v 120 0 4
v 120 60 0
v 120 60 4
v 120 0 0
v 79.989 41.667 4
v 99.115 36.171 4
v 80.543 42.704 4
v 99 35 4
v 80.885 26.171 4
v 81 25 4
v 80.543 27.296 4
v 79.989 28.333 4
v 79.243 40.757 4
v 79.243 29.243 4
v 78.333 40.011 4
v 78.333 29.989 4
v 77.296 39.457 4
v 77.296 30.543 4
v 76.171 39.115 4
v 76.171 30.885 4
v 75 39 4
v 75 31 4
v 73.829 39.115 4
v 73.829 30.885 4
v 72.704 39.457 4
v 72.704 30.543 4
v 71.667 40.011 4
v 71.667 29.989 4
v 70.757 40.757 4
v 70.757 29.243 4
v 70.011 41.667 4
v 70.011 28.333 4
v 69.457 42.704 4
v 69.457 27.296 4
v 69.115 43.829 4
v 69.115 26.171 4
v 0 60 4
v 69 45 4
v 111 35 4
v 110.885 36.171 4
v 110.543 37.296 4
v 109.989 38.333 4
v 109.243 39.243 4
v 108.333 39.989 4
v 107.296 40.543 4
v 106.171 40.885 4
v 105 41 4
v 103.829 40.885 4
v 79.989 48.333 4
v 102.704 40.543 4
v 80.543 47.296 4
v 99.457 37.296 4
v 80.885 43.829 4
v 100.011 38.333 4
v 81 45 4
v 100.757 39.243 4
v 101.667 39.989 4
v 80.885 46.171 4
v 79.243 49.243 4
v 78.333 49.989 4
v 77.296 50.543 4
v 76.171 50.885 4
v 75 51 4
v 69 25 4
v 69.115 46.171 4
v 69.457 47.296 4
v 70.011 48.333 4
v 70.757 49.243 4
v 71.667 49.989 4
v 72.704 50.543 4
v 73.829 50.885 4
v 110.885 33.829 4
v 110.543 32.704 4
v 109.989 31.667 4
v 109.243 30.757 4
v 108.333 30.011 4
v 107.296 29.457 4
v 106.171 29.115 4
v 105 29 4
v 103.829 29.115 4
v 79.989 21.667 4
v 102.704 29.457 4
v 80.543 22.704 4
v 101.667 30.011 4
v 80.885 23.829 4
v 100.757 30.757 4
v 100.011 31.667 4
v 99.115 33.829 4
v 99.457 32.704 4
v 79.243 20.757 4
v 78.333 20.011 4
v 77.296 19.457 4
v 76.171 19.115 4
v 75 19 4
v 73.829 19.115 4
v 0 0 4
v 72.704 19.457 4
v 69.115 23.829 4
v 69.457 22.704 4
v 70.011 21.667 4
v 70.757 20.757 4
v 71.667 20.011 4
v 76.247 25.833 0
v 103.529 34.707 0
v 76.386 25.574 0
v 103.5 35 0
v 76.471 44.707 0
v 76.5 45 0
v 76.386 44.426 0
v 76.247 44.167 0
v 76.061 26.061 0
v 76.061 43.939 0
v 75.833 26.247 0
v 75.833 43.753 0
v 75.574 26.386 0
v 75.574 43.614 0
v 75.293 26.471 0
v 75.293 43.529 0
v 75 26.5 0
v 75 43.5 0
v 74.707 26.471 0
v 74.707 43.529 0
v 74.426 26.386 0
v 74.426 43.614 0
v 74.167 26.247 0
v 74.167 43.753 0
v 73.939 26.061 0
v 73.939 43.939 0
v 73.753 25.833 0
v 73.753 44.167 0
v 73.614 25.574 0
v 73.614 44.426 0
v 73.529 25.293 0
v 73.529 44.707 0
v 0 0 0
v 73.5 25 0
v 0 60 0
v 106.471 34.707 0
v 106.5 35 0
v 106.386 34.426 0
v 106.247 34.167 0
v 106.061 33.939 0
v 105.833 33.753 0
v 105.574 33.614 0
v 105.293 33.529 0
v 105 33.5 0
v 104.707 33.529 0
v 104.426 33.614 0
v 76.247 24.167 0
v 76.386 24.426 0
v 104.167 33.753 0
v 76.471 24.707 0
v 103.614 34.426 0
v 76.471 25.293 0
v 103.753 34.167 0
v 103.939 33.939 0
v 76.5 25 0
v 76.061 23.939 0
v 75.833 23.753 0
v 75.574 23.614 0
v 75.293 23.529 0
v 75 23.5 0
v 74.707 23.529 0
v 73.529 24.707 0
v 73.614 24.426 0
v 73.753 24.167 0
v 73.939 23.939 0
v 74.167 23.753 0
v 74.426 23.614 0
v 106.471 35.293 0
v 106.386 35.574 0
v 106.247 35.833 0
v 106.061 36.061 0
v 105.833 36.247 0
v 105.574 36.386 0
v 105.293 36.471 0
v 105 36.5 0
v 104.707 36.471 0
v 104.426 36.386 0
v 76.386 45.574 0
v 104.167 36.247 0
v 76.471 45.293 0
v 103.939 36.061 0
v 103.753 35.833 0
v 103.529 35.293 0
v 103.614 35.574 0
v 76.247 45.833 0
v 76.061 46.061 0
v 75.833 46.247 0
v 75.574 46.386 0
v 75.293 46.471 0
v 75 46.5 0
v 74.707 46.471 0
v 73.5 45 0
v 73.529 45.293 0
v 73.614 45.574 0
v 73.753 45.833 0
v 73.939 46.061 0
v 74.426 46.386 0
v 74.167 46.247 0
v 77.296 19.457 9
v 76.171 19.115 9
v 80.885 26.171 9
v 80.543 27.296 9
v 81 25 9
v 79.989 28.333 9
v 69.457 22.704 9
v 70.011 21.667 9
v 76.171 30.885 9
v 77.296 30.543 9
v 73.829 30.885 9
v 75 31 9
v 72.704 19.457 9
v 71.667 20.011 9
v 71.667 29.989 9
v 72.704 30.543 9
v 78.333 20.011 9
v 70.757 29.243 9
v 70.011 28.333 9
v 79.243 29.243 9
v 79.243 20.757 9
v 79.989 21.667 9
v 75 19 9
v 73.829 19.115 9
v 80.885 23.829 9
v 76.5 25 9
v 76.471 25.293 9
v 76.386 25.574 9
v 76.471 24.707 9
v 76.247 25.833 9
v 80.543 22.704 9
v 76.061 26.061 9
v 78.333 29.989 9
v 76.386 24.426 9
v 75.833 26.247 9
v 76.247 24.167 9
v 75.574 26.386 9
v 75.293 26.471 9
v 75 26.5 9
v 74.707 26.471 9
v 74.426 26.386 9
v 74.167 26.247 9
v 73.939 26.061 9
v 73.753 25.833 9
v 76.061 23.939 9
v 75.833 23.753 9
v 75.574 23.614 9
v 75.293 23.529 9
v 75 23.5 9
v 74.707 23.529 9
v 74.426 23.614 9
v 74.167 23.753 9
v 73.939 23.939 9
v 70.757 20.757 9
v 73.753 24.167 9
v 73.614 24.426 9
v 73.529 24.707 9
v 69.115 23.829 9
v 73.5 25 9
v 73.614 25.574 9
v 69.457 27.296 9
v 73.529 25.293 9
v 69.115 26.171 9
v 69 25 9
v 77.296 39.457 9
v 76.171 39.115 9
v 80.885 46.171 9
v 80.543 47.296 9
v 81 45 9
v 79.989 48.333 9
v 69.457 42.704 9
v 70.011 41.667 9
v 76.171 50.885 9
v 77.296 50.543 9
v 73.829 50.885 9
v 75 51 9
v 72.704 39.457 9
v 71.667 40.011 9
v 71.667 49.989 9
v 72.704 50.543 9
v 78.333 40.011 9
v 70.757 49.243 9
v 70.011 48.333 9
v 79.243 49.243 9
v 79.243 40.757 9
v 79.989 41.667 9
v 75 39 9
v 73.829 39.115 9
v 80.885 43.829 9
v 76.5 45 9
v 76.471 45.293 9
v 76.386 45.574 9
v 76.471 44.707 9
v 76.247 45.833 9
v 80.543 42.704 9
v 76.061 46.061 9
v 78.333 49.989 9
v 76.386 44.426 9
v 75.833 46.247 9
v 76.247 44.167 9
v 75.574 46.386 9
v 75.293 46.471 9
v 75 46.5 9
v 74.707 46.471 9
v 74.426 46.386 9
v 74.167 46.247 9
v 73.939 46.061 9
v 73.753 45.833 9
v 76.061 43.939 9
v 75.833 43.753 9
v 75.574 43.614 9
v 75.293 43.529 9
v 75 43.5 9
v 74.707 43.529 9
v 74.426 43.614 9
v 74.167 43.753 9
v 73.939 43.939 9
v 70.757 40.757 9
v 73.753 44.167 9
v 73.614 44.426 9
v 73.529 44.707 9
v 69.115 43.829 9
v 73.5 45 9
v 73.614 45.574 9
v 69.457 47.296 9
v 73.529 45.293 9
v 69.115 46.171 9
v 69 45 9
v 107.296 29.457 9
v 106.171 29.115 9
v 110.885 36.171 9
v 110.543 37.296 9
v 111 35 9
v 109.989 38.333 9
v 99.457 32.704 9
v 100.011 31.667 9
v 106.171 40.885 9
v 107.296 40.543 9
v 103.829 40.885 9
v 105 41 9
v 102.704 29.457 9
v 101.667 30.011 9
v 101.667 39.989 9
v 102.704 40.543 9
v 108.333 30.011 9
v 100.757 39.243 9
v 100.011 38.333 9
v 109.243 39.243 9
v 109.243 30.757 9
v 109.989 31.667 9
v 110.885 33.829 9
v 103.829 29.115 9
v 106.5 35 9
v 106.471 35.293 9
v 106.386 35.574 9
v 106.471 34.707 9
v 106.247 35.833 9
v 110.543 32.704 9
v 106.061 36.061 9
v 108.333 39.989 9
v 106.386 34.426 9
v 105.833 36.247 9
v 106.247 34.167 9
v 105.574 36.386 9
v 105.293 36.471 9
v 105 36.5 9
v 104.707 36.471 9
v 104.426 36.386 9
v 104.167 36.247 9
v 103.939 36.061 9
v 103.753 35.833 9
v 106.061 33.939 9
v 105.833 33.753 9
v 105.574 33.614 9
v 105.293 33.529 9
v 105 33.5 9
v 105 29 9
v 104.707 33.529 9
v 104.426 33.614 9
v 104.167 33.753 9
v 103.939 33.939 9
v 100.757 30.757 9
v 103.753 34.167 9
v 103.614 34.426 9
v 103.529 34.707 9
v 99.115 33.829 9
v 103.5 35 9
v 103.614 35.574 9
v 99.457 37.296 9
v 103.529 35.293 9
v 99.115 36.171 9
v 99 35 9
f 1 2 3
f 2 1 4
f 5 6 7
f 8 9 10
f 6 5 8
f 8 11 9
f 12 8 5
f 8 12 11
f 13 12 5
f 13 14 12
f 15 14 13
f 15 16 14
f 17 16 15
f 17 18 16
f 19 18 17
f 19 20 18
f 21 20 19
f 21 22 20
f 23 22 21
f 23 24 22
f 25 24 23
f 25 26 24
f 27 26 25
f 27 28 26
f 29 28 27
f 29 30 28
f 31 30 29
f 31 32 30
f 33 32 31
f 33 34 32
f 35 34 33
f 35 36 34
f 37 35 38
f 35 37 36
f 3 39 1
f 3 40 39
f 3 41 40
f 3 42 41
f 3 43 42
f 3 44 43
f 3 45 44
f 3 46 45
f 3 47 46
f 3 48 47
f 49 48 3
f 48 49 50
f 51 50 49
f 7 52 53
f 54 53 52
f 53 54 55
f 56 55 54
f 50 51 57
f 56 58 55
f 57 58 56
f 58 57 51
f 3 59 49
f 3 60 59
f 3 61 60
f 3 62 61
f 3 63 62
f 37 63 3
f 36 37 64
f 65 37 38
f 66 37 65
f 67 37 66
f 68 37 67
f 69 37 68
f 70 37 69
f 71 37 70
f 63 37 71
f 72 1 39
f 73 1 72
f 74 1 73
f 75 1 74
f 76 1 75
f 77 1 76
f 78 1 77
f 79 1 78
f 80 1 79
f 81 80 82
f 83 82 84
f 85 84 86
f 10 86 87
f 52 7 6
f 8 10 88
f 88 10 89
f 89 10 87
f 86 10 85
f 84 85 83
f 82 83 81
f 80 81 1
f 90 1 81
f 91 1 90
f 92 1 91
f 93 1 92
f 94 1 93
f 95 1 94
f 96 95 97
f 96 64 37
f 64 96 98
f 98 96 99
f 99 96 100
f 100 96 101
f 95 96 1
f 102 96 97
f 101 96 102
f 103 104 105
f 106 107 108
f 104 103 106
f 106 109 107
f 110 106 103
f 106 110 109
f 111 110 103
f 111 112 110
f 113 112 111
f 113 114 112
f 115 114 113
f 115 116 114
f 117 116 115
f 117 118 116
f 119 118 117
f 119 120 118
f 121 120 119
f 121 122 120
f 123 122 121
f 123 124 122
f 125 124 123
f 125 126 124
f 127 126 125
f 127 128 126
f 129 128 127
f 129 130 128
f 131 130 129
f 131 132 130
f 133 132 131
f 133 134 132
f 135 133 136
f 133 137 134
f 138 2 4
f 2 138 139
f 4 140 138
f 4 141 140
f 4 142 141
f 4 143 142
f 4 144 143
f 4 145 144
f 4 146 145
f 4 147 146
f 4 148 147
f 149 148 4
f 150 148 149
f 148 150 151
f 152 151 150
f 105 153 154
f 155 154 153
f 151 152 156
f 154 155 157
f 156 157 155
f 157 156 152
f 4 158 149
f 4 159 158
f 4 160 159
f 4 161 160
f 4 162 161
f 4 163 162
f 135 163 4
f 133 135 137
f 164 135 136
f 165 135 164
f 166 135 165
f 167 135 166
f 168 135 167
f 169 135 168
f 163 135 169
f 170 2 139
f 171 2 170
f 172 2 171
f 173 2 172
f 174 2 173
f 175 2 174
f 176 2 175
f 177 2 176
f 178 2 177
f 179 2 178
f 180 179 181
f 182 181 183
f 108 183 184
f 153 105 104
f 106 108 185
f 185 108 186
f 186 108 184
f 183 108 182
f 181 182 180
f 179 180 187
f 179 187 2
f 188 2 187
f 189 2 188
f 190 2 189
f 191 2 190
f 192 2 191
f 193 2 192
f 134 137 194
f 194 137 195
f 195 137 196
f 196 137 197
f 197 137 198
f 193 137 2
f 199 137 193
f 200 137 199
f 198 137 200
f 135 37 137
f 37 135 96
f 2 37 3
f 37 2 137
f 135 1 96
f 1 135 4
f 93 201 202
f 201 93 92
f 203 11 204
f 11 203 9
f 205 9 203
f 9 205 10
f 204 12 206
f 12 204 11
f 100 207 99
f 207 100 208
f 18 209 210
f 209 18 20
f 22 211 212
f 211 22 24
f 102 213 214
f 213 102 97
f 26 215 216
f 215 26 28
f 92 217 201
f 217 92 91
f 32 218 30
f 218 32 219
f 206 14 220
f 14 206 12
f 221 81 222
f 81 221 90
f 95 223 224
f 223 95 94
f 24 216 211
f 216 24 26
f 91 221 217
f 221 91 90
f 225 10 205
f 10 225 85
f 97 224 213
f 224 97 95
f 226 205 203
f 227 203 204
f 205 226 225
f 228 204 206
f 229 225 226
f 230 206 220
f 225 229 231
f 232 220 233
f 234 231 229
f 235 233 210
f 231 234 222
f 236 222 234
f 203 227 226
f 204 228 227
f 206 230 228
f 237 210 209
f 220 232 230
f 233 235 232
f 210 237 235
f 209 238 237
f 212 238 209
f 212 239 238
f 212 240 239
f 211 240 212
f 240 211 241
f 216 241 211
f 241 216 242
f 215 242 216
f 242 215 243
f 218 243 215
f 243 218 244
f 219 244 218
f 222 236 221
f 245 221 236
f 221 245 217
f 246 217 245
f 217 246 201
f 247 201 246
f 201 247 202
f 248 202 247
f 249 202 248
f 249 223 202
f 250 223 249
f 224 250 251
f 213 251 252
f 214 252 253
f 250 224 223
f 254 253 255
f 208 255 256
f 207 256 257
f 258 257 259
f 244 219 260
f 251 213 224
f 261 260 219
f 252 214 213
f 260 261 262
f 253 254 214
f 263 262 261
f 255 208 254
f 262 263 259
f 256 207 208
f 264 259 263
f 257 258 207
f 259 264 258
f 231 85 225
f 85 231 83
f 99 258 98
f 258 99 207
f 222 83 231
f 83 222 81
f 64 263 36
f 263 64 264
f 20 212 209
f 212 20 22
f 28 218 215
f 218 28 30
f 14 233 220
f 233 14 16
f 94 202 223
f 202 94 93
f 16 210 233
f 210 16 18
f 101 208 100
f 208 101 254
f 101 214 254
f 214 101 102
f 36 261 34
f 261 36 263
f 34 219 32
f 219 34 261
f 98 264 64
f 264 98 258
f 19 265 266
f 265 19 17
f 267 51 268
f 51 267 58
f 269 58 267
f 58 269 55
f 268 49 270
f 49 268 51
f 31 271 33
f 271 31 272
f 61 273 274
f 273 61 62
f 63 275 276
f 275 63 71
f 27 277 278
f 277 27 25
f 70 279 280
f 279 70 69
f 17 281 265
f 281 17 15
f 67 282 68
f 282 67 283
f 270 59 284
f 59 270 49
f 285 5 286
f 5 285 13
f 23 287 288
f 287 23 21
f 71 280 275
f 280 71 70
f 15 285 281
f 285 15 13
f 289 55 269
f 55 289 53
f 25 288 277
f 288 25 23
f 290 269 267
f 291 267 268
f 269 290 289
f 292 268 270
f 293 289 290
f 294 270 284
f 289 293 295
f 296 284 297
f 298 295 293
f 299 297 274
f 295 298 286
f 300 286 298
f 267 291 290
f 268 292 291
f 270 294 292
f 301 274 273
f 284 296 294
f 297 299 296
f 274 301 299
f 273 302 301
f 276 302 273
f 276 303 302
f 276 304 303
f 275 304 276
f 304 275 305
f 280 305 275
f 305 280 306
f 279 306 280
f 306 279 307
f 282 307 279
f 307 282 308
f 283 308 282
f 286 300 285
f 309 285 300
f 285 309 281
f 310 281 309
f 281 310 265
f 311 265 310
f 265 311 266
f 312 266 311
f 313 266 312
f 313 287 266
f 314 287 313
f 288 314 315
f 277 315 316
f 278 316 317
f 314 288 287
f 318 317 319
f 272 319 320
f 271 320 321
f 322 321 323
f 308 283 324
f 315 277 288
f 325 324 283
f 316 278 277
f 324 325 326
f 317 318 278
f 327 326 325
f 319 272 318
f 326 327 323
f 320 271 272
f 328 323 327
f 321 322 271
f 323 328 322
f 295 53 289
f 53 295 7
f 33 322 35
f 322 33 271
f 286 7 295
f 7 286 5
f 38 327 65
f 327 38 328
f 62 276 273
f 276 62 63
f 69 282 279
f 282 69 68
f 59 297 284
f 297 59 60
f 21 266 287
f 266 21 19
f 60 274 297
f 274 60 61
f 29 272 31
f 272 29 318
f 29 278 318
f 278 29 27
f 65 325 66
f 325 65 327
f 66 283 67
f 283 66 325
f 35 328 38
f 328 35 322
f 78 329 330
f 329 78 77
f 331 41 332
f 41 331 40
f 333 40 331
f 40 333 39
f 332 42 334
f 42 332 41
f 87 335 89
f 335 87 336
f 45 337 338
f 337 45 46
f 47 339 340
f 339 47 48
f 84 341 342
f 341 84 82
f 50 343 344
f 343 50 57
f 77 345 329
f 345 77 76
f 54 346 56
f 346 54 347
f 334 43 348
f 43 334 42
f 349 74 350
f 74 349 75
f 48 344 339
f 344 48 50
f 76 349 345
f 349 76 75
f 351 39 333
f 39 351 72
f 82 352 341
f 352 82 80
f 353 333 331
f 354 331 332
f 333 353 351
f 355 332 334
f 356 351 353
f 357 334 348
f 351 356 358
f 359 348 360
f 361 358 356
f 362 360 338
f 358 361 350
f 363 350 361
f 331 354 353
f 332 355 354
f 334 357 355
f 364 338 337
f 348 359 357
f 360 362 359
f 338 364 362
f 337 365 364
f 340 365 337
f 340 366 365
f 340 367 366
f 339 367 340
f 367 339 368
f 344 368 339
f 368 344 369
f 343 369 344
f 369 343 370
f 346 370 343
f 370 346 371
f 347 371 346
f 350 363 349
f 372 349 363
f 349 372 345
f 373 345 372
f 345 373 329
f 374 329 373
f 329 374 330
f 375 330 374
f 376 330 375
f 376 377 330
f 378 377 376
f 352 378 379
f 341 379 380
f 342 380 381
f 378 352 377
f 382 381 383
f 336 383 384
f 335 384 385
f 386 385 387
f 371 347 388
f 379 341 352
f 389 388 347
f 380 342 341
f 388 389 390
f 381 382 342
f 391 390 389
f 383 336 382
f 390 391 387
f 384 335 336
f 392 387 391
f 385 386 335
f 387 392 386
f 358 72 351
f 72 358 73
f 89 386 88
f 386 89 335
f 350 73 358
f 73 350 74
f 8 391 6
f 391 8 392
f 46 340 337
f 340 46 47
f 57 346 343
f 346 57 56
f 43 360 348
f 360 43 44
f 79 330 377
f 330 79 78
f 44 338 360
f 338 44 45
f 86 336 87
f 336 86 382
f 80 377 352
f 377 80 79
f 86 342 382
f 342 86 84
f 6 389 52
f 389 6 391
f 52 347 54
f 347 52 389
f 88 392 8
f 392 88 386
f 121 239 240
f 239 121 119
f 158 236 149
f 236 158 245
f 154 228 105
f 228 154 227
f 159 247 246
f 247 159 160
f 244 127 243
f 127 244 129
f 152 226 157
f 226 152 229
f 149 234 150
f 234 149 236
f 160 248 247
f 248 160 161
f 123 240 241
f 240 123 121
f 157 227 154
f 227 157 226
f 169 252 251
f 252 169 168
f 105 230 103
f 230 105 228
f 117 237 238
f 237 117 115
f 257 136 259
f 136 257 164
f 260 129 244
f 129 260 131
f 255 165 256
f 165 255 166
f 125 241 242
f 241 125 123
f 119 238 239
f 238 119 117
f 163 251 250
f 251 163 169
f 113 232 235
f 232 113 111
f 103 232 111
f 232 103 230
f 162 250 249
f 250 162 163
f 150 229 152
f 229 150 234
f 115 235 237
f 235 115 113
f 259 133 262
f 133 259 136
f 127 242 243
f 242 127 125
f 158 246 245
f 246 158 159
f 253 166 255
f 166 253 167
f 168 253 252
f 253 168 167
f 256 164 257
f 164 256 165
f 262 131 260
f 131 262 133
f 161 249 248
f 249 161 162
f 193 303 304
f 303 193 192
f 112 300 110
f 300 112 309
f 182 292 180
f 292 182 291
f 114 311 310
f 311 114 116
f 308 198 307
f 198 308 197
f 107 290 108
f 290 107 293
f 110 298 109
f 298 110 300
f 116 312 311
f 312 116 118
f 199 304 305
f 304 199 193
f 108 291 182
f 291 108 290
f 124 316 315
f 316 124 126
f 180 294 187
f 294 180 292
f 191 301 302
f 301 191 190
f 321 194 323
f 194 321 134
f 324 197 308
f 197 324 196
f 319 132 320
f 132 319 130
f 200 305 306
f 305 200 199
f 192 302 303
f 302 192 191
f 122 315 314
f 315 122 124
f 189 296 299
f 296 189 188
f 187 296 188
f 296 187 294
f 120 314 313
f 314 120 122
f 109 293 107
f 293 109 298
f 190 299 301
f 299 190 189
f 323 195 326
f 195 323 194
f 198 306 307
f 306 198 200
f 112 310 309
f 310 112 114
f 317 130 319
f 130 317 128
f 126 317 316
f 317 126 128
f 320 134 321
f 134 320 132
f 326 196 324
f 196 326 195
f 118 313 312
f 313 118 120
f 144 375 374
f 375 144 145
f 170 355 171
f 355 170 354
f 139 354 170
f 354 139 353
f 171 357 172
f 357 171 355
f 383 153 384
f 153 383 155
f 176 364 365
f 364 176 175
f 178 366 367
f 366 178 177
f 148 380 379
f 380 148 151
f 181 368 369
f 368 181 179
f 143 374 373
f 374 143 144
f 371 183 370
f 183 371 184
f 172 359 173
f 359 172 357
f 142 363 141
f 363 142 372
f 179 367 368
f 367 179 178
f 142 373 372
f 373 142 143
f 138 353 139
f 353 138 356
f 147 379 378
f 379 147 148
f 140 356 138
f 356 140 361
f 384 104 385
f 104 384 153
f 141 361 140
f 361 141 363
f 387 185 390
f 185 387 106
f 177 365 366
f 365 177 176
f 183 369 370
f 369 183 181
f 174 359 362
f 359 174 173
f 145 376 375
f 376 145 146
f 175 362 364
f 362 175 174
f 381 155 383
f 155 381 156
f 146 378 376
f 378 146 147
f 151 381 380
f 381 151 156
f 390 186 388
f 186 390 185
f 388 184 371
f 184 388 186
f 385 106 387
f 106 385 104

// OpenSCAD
$fn = 32;

// ----------------------------------------------------------------------
// Boss field: plate with bosses at given coordinates
// ----------------------------------------------------------------------

// --- parameters (mm) ---
plate_l = 120;            // plate length, X
plate_w = 60;             // plate width, Y
plate_t = 4;              // plate thickness, Z
boss_d = 12;              // boss diameter
boss_h = 5;               // boss height above the plate
bore_d = 3;               // boss bore

total_h = plate_t + boss_h;  // overall height

difference() {
  union() {
    cube([plate_l, plate_w, plate_t]);
    translate([75, 25, plate_t]) cylinder(h = boss_h, d = boss_d);
    translate([75, 45, plate_t]) cylinder(h = boss_h, d = boss_d);
    translate([105, 35, plate_t]) cylinder(h = boss_h, d = boss_d);
  }
  translate([75, 25, -1]) cylinder(h = total_h + 2, d = bore_d);
  translate([75, 45, -1]) cylinder(h = total_h + 2, d = bore_d);
  translate([105, 35, -1]) cylinder(h = total_h + 2, d = bore_d);
}
